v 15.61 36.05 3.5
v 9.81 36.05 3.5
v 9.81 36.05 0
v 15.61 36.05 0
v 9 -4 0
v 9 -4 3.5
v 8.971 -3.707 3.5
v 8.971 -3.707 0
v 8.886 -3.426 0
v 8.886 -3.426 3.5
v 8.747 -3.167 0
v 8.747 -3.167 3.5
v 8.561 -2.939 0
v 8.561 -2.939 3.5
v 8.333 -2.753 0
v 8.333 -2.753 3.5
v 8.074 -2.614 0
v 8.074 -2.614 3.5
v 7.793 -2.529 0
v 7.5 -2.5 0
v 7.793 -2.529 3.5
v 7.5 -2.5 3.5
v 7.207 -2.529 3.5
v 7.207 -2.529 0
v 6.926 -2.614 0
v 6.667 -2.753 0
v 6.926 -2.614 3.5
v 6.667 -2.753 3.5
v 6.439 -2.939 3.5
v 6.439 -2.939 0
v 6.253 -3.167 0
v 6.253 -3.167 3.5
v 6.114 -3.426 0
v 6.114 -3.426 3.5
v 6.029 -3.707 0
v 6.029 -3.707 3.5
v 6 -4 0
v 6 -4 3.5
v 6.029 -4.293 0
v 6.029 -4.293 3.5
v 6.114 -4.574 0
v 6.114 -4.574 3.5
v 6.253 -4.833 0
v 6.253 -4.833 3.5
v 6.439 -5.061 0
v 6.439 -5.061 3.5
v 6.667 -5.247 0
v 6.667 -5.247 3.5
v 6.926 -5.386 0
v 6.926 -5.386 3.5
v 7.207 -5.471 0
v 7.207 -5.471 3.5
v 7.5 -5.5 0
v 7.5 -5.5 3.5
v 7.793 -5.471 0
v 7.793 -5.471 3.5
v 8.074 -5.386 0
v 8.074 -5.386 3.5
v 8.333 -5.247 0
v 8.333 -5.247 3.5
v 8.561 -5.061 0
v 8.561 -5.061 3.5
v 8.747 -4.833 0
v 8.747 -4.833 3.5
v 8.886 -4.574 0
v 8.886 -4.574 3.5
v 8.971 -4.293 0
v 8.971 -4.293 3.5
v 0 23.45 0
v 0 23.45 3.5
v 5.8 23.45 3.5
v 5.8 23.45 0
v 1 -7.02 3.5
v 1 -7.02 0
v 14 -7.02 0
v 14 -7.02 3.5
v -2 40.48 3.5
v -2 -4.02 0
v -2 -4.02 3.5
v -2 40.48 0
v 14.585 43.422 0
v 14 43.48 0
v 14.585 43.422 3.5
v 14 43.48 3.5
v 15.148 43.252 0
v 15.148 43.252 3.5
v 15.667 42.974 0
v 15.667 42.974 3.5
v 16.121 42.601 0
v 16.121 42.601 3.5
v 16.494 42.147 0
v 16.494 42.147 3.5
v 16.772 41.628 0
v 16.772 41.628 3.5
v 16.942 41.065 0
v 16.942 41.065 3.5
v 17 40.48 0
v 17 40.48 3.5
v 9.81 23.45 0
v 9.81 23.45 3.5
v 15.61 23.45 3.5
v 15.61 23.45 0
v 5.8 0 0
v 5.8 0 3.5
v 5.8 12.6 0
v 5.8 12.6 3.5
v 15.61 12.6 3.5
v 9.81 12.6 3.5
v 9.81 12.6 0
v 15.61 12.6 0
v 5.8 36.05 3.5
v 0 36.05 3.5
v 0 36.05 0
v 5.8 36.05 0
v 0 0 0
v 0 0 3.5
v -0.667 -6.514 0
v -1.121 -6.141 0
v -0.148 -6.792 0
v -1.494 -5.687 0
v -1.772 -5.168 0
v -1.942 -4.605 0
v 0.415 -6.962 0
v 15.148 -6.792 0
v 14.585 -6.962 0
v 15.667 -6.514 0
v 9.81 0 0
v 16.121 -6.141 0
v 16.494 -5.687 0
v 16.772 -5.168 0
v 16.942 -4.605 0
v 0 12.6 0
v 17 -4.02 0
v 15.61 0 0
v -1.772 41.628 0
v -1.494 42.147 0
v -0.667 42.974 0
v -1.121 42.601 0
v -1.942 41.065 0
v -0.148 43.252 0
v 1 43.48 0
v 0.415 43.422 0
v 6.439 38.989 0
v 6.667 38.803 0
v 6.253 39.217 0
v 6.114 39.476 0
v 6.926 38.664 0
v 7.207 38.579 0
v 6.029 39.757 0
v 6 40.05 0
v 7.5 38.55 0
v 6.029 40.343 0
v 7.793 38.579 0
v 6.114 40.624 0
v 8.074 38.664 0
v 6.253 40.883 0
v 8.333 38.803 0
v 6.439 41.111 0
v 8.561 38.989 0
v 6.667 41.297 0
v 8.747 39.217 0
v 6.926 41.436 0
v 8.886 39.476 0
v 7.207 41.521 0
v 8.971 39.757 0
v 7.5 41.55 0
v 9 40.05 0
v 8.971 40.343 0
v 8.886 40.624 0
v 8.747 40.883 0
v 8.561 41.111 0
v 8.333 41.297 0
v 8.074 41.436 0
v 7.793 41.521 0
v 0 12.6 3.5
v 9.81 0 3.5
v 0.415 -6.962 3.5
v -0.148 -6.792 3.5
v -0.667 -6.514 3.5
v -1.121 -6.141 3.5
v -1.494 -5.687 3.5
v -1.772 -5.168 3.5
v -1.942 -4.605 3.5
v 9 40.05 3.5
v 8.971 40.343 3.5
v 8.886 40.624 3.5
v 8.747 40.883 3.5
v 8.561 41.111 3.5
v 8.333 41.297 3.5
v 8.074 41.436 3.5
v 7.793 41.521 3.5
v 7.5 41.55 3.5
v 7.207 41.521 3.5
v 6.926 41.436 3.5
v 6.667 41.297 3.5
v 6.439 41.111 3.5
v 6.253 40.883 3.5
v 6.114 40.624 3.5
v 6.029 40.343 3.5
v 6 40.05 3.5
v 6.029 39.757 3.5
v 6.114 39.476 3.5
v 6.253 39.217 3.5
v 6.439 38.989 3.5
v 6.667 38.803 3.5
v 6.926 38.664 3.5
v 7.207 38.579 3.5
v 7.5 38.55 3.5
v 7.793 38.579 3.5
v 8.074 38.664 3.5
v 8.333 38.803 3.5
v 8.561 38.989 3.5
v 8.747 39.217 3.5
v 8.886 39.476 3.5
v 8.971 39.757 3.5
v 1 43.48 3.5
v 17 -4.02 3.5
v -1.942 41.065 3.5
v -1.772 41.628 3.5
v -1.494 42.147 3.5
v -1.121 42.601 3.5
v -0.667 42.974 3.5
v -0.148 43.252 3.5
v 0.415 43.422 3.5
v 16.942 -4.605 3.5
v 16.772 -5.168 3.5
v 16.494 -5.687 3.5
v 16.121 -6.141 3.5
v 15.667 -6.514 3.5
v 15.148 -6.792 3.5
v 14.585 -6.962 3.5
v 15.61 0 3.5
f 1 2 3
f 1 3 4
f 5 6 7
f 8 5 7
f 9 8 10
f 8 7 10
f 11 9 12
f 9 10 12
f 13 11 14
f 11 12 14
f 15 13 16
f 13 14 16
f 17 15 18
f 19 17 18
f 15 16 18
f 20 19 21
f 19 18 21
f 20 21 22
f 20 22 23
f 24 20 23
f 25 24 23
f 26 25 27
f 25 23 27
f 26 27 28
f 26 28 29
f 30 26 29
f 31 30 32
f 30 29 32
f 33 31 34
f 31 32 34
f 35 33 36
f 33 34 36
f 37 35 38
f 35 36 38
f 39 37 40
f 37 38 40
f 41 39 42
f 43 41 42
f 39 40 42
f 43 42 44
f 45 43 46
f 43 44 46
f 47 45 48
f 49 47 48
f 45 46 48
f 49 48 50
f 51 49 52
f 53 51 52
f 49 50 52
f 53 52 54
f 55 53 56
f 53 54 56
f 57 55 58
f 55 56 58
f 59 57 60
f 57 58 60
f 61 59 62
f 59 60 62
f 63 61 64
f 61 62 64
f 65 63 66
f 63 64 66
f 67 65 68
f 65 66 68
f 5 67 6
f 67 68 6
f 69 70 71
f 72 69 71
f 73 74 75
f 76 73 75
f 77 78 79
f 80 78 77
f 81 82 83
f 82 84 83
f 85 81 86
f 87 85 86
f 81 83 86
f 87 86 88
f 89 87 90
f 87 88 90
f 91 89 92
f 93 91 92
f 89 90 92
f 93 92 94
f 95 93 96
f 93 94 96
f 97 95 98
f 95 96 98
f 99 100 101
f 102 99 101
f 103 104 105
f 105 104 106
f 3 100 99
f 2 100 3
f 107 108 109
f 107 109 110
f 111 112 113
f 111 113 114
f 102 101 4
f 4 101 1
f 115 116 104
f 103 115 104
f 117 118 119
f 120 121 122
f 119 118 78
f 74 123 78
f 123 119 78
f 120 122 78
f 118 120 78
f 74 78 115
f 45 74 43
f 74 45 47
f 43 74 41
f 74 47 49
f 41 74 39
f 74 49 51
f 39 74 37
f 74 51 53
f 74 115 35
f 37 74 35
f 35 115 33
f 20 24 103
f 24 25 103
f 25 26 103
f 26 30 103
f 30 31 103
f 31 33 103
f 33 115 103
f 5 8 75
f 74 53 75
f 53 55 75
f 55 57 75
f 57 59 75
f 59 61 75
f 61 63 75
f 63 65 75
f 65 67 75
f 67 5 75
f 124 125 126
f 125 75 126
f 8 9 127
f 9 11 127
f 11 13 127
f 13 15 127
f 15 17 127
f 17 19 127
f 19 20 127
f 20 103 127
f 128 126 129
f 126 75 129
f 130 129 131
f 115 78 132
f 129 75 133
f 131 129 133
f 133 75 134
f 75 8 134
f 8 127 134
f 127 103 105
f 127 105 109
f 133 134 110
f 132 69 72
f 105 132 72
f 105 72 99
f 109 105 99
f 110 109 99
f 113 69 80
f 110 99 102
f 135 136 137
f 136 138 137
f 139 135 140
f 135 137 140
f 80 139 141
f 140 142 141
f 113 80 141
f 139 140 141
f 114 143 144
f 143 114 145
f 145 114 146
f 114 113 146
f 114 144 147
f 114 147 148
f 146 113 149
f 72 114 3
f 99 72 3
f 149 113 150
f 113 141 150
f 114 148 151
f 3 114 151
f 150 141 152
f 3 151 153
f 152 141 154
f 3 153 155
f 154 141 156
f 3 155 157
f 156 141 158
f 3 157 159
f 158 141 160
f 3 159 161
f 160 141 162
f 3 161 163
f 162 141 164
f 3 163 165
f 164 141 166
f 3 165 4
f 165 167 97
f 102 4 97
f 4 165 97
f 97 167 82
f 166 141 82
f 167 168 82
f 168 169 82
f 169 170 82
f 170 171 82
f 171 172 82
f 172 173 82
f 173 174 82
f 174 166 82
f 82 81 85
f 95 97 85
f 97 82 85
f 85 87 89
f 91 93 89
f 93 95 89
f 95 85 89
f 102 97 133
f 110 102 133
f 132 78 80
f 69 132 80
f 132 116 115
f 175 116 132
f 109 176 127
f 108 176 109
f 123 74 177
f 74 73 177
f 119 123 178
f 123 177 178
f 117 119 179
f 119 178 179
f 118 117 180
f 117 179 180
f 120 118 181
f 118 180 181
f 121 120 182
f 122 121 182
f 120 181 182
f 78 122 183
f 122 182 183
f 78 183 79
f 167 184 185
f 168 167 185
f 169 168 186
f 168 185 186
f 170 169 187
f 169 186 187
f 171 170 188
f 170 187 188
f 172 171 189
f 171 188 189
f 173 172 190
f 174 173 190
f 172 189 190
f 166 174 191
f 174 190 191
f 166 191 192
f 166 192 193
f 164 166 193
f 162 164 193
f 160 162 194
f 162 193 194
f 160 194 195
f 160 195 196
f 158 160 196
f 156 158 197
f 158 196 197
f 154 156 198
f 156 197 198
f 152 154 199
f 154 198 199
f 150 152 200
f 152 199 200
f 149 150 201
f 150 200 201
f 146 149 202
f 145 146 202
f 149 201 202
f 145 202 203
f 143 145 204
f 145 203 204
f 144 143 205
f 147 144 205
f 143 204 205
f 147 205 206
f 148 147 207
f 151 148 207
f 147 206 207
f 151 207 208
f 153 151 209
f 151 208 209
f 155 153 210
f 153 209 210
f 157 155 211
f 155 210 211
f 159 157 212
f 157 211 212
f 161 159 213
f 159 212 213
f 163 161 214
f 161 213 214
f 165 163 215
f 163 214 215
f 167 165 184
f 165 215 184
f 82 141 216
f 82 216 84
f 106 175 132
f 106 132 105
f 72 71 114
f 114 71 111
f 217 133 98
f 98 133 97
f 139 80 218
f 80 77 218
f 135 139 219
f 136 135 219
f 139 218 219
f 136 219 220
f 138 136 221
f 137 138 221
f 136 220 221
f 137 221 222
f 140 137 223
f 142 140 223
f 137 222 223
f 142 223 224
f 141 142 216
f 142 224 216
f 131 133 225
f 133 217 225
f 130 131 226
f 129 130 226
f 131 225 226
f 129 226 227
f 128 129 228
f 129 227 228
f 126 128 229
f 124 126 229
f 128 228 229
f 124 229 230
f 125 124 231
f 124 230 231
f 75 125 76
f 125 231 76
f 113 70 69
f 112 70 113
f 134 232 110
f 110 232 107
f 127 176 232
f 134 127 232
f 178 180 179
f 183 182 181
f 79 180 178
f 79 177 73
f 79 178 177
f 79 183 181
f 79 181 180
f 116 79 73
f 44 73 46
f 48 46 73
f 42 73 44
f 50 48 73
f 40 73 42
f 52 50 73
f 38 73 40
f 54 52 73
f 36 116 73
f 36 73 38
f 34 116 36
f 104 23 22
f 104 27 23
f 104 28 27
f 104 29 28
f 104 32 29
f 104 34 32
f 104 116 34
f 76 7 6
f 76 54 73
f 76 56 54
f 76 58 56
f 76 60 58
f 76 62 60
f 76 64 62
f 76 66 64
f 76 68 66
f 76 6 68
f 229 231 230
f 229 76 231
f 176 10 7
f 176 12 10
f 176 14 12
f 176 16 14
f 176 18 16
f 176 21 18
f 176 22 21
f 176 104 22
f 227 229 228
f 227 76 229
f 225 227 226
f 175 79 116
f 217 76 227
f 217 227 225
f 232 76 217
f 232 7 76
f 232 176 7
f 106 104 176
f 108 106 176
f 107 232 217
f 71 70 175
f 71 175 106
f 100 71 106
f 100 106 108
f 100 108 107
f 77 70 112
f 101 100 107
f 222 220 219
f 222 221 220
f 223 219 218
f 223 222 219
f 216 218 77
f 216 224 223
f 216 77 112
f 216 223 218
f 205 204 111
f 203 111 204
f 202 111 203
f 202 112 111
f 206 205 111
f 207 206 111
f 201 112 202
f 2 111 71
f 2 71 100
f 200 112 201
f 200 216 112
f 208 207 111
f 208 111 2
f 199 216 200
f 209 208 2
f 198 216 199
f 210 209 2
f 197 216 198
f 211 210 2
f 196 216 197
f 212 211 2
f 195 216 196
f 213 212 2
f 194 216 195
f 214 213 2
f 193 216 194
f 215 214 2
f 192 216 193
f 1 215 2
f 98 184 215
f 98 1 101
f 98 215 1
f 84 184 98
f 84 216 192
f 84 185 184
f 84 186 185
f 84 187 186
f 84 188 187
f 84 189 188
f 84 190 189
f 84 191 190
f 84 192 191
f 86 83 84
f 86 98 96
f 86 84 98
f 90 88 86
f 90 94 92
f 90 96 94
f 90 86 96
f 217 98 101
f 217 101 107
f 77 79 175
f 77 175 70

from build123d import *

# Parameters (mm, degrees)
SKETCH_W     = 19
SKETCH_H     = 50.5
PAD_DEPTH    = 3.5
SKETCH001_R  = 1.5
SKETCH001_W  = 5.8
SKETCH001_H  = 12.6
POCKET_DEPTH = 3.5
FILLET_R     = 3
FILLET001_R  = 3
FILLET002_R  = 3
FILLET003_R  = 3


with BuildPart() as part:
    # Sketch → Pad (new body)
    with BuildSketch(Plane.XY):
        with Locations((7.5, 18.23)):
            Rectangle(SKETCH_W, SKETCH_H)
    extrude(amount=PAD_DEPTH)

    # Sketch001 (on Face6 of Pad) → Pocket (cut)
    with BuildSketch(Plane.XY.offset(3.5)):
        with Locations((7.5, -4)):
            Circle(SKETCH001_R)
        with Locations((7.5, 40.05)):
            Circle(SKETCH001_R)
        with Locations((2.9, 29.75)):
            Rectangle(SKETCH001_W, SKETCH001_H)
        with Locations((12.71, 29.75)):
            Rectangle(SKETCH001_W, SKETCH001_H)
        with Locations((2.9, 6.3)):
            Rectangle(SKETCH001_W, SKETCH001_H)
        with Locations((12.71, 6.3)):
            Rectangle(SKETCH001_W, SKETCH001_H)
    extrude(amount=-POCKET_DEPTH, mode=Mode.SUBTRACT)

    # Fillet
    fillet_edges = [part.edges().sort_by_distance(p)[0] for p in [
        (-2, 43.48, 1.75),
    ]]
    fillet(fillet_edges, radius=FILLET_R)

    # Fillet001
    fillet001_edges = [part.edges().sort_by_distance(p)[0] for p in [
        (17, 43.48, 1.75),
    ]]
    fillet(fillet001_edges, radius=FILLET001_R)

    # Fillet002
    fillet002_edges = [part.edges().sort_by_distance(p)[0] for p in [
        (17, -7.02, 1.75),
    ]]
    fillet(fillet002_edges, radius=FILLET002_R)

    # Fillet003
    fillet003_edges = [part.edges().sort_by_distance(p)[0] for p in [
        (-2, -7.02, 1.75),
    ]]
    fillet(fillet003_edges, radius=FILLET003_R)


solid = part.part
